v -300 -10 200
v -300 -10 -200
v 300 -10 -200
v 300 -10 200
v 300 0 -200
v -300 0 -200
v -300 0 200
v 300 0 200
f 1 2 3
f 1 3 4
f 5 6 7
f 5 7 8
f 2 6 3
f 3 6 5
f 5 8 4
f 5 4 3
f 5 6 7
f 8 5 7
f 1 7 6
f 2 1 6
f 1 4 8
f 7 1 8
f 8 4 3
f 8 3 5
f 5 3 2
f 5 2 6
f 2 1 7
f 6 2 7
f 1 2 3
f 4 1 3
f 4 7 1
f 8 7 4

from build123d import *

# Parameters (mm, degrees)
SKETCH1_W                 = 600
SKETCH1_H                 = 400
BOSS_EXTRUDE1_DEPTH       = 10
BODY_MOVE_COPY1_START     = -300
BODY_MOVE_COPY1_OUTLINE_W = 10
BODY_MOVE_COPY1_OUTLINE_H = 400
BODY_MOVE_COPY1_DEPTH     = 600


# Read off the part's stored shape, not the designer's step: Body-Move/Copy1
with BuildPart() as part:
    # Sketch1 → Boss-Extrude1 (new body)
    with BuildSketch(Plane(origin=(0, 0, 0), x_dir=(1, 0, 0), z_dir=(0, 1, 0))):
        Rectangle(SKETCH1_W, SKETCH1_H)
    extrude(amount=-BOSS_EXTRUDE1_DEPTH)


with BuildPart() as body_2:
    # Body-Move/Copy1 outline → Body-Move/Copy1 (new body)
    with BuildSketch(Plane.YZ.offset(BODY_MOVE_COPY1_START)):
        with Locations((-5, 0)):
            Rectangle(BODY_MOVE_COPY1_OUTLINE_W, BODY_MOVE_COPY1_OUTLINE_H)
    extrude(amount=BODY_MOVE_COPY1_DEPTH)


solid = Compound([part.part, body_2.part])
